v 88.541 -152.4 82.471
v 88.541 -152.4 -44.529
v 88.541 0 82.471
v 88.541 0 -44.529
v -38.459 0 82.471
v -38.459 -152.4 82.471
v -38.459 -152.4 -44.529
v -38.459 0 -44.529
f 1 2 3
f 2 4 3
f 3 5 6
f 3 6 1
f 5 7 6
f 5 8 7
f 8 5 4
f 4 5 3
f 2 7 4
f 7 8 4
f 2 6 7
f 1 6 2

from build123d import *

# Parameters (mm, degrees)
F0_W     = 127
F0_H     = 127
F1_DEPTH = 25.4
F2_DEPTH = 101.6
F3_W     = 127
F3_H     = 127
F4_DEPTH = 25.4


with BuildPart() as f1:
    # F0 (on Front) → F1 (new body)
    with BuildSketch(Plane.XZ):
        with Locations((25.0412524156, 18.9714580774)):
            Rectangle(F0_W, F0_H)
    extrude(amount=F1_DEPTH)

    # F2 (add): a face of the model
    f2_faces = [f1.faces().sort_by_distance(p)[0] for p in [
        (25.0412524156, -25.4, 18.9714580774),
    ]]
    extrude(f2_faces, amount=F2_DEPTH)

    # F3 (on face) → F4 (join)
    with BuildSketch(Plane.XZ.offset(127)):
        with Locations((25.0412524156, 18.9714580774)):
            Rectangle(F3_W, F3_H)
    extrude(amount=F4_DEPTH)


solid = f1.part
